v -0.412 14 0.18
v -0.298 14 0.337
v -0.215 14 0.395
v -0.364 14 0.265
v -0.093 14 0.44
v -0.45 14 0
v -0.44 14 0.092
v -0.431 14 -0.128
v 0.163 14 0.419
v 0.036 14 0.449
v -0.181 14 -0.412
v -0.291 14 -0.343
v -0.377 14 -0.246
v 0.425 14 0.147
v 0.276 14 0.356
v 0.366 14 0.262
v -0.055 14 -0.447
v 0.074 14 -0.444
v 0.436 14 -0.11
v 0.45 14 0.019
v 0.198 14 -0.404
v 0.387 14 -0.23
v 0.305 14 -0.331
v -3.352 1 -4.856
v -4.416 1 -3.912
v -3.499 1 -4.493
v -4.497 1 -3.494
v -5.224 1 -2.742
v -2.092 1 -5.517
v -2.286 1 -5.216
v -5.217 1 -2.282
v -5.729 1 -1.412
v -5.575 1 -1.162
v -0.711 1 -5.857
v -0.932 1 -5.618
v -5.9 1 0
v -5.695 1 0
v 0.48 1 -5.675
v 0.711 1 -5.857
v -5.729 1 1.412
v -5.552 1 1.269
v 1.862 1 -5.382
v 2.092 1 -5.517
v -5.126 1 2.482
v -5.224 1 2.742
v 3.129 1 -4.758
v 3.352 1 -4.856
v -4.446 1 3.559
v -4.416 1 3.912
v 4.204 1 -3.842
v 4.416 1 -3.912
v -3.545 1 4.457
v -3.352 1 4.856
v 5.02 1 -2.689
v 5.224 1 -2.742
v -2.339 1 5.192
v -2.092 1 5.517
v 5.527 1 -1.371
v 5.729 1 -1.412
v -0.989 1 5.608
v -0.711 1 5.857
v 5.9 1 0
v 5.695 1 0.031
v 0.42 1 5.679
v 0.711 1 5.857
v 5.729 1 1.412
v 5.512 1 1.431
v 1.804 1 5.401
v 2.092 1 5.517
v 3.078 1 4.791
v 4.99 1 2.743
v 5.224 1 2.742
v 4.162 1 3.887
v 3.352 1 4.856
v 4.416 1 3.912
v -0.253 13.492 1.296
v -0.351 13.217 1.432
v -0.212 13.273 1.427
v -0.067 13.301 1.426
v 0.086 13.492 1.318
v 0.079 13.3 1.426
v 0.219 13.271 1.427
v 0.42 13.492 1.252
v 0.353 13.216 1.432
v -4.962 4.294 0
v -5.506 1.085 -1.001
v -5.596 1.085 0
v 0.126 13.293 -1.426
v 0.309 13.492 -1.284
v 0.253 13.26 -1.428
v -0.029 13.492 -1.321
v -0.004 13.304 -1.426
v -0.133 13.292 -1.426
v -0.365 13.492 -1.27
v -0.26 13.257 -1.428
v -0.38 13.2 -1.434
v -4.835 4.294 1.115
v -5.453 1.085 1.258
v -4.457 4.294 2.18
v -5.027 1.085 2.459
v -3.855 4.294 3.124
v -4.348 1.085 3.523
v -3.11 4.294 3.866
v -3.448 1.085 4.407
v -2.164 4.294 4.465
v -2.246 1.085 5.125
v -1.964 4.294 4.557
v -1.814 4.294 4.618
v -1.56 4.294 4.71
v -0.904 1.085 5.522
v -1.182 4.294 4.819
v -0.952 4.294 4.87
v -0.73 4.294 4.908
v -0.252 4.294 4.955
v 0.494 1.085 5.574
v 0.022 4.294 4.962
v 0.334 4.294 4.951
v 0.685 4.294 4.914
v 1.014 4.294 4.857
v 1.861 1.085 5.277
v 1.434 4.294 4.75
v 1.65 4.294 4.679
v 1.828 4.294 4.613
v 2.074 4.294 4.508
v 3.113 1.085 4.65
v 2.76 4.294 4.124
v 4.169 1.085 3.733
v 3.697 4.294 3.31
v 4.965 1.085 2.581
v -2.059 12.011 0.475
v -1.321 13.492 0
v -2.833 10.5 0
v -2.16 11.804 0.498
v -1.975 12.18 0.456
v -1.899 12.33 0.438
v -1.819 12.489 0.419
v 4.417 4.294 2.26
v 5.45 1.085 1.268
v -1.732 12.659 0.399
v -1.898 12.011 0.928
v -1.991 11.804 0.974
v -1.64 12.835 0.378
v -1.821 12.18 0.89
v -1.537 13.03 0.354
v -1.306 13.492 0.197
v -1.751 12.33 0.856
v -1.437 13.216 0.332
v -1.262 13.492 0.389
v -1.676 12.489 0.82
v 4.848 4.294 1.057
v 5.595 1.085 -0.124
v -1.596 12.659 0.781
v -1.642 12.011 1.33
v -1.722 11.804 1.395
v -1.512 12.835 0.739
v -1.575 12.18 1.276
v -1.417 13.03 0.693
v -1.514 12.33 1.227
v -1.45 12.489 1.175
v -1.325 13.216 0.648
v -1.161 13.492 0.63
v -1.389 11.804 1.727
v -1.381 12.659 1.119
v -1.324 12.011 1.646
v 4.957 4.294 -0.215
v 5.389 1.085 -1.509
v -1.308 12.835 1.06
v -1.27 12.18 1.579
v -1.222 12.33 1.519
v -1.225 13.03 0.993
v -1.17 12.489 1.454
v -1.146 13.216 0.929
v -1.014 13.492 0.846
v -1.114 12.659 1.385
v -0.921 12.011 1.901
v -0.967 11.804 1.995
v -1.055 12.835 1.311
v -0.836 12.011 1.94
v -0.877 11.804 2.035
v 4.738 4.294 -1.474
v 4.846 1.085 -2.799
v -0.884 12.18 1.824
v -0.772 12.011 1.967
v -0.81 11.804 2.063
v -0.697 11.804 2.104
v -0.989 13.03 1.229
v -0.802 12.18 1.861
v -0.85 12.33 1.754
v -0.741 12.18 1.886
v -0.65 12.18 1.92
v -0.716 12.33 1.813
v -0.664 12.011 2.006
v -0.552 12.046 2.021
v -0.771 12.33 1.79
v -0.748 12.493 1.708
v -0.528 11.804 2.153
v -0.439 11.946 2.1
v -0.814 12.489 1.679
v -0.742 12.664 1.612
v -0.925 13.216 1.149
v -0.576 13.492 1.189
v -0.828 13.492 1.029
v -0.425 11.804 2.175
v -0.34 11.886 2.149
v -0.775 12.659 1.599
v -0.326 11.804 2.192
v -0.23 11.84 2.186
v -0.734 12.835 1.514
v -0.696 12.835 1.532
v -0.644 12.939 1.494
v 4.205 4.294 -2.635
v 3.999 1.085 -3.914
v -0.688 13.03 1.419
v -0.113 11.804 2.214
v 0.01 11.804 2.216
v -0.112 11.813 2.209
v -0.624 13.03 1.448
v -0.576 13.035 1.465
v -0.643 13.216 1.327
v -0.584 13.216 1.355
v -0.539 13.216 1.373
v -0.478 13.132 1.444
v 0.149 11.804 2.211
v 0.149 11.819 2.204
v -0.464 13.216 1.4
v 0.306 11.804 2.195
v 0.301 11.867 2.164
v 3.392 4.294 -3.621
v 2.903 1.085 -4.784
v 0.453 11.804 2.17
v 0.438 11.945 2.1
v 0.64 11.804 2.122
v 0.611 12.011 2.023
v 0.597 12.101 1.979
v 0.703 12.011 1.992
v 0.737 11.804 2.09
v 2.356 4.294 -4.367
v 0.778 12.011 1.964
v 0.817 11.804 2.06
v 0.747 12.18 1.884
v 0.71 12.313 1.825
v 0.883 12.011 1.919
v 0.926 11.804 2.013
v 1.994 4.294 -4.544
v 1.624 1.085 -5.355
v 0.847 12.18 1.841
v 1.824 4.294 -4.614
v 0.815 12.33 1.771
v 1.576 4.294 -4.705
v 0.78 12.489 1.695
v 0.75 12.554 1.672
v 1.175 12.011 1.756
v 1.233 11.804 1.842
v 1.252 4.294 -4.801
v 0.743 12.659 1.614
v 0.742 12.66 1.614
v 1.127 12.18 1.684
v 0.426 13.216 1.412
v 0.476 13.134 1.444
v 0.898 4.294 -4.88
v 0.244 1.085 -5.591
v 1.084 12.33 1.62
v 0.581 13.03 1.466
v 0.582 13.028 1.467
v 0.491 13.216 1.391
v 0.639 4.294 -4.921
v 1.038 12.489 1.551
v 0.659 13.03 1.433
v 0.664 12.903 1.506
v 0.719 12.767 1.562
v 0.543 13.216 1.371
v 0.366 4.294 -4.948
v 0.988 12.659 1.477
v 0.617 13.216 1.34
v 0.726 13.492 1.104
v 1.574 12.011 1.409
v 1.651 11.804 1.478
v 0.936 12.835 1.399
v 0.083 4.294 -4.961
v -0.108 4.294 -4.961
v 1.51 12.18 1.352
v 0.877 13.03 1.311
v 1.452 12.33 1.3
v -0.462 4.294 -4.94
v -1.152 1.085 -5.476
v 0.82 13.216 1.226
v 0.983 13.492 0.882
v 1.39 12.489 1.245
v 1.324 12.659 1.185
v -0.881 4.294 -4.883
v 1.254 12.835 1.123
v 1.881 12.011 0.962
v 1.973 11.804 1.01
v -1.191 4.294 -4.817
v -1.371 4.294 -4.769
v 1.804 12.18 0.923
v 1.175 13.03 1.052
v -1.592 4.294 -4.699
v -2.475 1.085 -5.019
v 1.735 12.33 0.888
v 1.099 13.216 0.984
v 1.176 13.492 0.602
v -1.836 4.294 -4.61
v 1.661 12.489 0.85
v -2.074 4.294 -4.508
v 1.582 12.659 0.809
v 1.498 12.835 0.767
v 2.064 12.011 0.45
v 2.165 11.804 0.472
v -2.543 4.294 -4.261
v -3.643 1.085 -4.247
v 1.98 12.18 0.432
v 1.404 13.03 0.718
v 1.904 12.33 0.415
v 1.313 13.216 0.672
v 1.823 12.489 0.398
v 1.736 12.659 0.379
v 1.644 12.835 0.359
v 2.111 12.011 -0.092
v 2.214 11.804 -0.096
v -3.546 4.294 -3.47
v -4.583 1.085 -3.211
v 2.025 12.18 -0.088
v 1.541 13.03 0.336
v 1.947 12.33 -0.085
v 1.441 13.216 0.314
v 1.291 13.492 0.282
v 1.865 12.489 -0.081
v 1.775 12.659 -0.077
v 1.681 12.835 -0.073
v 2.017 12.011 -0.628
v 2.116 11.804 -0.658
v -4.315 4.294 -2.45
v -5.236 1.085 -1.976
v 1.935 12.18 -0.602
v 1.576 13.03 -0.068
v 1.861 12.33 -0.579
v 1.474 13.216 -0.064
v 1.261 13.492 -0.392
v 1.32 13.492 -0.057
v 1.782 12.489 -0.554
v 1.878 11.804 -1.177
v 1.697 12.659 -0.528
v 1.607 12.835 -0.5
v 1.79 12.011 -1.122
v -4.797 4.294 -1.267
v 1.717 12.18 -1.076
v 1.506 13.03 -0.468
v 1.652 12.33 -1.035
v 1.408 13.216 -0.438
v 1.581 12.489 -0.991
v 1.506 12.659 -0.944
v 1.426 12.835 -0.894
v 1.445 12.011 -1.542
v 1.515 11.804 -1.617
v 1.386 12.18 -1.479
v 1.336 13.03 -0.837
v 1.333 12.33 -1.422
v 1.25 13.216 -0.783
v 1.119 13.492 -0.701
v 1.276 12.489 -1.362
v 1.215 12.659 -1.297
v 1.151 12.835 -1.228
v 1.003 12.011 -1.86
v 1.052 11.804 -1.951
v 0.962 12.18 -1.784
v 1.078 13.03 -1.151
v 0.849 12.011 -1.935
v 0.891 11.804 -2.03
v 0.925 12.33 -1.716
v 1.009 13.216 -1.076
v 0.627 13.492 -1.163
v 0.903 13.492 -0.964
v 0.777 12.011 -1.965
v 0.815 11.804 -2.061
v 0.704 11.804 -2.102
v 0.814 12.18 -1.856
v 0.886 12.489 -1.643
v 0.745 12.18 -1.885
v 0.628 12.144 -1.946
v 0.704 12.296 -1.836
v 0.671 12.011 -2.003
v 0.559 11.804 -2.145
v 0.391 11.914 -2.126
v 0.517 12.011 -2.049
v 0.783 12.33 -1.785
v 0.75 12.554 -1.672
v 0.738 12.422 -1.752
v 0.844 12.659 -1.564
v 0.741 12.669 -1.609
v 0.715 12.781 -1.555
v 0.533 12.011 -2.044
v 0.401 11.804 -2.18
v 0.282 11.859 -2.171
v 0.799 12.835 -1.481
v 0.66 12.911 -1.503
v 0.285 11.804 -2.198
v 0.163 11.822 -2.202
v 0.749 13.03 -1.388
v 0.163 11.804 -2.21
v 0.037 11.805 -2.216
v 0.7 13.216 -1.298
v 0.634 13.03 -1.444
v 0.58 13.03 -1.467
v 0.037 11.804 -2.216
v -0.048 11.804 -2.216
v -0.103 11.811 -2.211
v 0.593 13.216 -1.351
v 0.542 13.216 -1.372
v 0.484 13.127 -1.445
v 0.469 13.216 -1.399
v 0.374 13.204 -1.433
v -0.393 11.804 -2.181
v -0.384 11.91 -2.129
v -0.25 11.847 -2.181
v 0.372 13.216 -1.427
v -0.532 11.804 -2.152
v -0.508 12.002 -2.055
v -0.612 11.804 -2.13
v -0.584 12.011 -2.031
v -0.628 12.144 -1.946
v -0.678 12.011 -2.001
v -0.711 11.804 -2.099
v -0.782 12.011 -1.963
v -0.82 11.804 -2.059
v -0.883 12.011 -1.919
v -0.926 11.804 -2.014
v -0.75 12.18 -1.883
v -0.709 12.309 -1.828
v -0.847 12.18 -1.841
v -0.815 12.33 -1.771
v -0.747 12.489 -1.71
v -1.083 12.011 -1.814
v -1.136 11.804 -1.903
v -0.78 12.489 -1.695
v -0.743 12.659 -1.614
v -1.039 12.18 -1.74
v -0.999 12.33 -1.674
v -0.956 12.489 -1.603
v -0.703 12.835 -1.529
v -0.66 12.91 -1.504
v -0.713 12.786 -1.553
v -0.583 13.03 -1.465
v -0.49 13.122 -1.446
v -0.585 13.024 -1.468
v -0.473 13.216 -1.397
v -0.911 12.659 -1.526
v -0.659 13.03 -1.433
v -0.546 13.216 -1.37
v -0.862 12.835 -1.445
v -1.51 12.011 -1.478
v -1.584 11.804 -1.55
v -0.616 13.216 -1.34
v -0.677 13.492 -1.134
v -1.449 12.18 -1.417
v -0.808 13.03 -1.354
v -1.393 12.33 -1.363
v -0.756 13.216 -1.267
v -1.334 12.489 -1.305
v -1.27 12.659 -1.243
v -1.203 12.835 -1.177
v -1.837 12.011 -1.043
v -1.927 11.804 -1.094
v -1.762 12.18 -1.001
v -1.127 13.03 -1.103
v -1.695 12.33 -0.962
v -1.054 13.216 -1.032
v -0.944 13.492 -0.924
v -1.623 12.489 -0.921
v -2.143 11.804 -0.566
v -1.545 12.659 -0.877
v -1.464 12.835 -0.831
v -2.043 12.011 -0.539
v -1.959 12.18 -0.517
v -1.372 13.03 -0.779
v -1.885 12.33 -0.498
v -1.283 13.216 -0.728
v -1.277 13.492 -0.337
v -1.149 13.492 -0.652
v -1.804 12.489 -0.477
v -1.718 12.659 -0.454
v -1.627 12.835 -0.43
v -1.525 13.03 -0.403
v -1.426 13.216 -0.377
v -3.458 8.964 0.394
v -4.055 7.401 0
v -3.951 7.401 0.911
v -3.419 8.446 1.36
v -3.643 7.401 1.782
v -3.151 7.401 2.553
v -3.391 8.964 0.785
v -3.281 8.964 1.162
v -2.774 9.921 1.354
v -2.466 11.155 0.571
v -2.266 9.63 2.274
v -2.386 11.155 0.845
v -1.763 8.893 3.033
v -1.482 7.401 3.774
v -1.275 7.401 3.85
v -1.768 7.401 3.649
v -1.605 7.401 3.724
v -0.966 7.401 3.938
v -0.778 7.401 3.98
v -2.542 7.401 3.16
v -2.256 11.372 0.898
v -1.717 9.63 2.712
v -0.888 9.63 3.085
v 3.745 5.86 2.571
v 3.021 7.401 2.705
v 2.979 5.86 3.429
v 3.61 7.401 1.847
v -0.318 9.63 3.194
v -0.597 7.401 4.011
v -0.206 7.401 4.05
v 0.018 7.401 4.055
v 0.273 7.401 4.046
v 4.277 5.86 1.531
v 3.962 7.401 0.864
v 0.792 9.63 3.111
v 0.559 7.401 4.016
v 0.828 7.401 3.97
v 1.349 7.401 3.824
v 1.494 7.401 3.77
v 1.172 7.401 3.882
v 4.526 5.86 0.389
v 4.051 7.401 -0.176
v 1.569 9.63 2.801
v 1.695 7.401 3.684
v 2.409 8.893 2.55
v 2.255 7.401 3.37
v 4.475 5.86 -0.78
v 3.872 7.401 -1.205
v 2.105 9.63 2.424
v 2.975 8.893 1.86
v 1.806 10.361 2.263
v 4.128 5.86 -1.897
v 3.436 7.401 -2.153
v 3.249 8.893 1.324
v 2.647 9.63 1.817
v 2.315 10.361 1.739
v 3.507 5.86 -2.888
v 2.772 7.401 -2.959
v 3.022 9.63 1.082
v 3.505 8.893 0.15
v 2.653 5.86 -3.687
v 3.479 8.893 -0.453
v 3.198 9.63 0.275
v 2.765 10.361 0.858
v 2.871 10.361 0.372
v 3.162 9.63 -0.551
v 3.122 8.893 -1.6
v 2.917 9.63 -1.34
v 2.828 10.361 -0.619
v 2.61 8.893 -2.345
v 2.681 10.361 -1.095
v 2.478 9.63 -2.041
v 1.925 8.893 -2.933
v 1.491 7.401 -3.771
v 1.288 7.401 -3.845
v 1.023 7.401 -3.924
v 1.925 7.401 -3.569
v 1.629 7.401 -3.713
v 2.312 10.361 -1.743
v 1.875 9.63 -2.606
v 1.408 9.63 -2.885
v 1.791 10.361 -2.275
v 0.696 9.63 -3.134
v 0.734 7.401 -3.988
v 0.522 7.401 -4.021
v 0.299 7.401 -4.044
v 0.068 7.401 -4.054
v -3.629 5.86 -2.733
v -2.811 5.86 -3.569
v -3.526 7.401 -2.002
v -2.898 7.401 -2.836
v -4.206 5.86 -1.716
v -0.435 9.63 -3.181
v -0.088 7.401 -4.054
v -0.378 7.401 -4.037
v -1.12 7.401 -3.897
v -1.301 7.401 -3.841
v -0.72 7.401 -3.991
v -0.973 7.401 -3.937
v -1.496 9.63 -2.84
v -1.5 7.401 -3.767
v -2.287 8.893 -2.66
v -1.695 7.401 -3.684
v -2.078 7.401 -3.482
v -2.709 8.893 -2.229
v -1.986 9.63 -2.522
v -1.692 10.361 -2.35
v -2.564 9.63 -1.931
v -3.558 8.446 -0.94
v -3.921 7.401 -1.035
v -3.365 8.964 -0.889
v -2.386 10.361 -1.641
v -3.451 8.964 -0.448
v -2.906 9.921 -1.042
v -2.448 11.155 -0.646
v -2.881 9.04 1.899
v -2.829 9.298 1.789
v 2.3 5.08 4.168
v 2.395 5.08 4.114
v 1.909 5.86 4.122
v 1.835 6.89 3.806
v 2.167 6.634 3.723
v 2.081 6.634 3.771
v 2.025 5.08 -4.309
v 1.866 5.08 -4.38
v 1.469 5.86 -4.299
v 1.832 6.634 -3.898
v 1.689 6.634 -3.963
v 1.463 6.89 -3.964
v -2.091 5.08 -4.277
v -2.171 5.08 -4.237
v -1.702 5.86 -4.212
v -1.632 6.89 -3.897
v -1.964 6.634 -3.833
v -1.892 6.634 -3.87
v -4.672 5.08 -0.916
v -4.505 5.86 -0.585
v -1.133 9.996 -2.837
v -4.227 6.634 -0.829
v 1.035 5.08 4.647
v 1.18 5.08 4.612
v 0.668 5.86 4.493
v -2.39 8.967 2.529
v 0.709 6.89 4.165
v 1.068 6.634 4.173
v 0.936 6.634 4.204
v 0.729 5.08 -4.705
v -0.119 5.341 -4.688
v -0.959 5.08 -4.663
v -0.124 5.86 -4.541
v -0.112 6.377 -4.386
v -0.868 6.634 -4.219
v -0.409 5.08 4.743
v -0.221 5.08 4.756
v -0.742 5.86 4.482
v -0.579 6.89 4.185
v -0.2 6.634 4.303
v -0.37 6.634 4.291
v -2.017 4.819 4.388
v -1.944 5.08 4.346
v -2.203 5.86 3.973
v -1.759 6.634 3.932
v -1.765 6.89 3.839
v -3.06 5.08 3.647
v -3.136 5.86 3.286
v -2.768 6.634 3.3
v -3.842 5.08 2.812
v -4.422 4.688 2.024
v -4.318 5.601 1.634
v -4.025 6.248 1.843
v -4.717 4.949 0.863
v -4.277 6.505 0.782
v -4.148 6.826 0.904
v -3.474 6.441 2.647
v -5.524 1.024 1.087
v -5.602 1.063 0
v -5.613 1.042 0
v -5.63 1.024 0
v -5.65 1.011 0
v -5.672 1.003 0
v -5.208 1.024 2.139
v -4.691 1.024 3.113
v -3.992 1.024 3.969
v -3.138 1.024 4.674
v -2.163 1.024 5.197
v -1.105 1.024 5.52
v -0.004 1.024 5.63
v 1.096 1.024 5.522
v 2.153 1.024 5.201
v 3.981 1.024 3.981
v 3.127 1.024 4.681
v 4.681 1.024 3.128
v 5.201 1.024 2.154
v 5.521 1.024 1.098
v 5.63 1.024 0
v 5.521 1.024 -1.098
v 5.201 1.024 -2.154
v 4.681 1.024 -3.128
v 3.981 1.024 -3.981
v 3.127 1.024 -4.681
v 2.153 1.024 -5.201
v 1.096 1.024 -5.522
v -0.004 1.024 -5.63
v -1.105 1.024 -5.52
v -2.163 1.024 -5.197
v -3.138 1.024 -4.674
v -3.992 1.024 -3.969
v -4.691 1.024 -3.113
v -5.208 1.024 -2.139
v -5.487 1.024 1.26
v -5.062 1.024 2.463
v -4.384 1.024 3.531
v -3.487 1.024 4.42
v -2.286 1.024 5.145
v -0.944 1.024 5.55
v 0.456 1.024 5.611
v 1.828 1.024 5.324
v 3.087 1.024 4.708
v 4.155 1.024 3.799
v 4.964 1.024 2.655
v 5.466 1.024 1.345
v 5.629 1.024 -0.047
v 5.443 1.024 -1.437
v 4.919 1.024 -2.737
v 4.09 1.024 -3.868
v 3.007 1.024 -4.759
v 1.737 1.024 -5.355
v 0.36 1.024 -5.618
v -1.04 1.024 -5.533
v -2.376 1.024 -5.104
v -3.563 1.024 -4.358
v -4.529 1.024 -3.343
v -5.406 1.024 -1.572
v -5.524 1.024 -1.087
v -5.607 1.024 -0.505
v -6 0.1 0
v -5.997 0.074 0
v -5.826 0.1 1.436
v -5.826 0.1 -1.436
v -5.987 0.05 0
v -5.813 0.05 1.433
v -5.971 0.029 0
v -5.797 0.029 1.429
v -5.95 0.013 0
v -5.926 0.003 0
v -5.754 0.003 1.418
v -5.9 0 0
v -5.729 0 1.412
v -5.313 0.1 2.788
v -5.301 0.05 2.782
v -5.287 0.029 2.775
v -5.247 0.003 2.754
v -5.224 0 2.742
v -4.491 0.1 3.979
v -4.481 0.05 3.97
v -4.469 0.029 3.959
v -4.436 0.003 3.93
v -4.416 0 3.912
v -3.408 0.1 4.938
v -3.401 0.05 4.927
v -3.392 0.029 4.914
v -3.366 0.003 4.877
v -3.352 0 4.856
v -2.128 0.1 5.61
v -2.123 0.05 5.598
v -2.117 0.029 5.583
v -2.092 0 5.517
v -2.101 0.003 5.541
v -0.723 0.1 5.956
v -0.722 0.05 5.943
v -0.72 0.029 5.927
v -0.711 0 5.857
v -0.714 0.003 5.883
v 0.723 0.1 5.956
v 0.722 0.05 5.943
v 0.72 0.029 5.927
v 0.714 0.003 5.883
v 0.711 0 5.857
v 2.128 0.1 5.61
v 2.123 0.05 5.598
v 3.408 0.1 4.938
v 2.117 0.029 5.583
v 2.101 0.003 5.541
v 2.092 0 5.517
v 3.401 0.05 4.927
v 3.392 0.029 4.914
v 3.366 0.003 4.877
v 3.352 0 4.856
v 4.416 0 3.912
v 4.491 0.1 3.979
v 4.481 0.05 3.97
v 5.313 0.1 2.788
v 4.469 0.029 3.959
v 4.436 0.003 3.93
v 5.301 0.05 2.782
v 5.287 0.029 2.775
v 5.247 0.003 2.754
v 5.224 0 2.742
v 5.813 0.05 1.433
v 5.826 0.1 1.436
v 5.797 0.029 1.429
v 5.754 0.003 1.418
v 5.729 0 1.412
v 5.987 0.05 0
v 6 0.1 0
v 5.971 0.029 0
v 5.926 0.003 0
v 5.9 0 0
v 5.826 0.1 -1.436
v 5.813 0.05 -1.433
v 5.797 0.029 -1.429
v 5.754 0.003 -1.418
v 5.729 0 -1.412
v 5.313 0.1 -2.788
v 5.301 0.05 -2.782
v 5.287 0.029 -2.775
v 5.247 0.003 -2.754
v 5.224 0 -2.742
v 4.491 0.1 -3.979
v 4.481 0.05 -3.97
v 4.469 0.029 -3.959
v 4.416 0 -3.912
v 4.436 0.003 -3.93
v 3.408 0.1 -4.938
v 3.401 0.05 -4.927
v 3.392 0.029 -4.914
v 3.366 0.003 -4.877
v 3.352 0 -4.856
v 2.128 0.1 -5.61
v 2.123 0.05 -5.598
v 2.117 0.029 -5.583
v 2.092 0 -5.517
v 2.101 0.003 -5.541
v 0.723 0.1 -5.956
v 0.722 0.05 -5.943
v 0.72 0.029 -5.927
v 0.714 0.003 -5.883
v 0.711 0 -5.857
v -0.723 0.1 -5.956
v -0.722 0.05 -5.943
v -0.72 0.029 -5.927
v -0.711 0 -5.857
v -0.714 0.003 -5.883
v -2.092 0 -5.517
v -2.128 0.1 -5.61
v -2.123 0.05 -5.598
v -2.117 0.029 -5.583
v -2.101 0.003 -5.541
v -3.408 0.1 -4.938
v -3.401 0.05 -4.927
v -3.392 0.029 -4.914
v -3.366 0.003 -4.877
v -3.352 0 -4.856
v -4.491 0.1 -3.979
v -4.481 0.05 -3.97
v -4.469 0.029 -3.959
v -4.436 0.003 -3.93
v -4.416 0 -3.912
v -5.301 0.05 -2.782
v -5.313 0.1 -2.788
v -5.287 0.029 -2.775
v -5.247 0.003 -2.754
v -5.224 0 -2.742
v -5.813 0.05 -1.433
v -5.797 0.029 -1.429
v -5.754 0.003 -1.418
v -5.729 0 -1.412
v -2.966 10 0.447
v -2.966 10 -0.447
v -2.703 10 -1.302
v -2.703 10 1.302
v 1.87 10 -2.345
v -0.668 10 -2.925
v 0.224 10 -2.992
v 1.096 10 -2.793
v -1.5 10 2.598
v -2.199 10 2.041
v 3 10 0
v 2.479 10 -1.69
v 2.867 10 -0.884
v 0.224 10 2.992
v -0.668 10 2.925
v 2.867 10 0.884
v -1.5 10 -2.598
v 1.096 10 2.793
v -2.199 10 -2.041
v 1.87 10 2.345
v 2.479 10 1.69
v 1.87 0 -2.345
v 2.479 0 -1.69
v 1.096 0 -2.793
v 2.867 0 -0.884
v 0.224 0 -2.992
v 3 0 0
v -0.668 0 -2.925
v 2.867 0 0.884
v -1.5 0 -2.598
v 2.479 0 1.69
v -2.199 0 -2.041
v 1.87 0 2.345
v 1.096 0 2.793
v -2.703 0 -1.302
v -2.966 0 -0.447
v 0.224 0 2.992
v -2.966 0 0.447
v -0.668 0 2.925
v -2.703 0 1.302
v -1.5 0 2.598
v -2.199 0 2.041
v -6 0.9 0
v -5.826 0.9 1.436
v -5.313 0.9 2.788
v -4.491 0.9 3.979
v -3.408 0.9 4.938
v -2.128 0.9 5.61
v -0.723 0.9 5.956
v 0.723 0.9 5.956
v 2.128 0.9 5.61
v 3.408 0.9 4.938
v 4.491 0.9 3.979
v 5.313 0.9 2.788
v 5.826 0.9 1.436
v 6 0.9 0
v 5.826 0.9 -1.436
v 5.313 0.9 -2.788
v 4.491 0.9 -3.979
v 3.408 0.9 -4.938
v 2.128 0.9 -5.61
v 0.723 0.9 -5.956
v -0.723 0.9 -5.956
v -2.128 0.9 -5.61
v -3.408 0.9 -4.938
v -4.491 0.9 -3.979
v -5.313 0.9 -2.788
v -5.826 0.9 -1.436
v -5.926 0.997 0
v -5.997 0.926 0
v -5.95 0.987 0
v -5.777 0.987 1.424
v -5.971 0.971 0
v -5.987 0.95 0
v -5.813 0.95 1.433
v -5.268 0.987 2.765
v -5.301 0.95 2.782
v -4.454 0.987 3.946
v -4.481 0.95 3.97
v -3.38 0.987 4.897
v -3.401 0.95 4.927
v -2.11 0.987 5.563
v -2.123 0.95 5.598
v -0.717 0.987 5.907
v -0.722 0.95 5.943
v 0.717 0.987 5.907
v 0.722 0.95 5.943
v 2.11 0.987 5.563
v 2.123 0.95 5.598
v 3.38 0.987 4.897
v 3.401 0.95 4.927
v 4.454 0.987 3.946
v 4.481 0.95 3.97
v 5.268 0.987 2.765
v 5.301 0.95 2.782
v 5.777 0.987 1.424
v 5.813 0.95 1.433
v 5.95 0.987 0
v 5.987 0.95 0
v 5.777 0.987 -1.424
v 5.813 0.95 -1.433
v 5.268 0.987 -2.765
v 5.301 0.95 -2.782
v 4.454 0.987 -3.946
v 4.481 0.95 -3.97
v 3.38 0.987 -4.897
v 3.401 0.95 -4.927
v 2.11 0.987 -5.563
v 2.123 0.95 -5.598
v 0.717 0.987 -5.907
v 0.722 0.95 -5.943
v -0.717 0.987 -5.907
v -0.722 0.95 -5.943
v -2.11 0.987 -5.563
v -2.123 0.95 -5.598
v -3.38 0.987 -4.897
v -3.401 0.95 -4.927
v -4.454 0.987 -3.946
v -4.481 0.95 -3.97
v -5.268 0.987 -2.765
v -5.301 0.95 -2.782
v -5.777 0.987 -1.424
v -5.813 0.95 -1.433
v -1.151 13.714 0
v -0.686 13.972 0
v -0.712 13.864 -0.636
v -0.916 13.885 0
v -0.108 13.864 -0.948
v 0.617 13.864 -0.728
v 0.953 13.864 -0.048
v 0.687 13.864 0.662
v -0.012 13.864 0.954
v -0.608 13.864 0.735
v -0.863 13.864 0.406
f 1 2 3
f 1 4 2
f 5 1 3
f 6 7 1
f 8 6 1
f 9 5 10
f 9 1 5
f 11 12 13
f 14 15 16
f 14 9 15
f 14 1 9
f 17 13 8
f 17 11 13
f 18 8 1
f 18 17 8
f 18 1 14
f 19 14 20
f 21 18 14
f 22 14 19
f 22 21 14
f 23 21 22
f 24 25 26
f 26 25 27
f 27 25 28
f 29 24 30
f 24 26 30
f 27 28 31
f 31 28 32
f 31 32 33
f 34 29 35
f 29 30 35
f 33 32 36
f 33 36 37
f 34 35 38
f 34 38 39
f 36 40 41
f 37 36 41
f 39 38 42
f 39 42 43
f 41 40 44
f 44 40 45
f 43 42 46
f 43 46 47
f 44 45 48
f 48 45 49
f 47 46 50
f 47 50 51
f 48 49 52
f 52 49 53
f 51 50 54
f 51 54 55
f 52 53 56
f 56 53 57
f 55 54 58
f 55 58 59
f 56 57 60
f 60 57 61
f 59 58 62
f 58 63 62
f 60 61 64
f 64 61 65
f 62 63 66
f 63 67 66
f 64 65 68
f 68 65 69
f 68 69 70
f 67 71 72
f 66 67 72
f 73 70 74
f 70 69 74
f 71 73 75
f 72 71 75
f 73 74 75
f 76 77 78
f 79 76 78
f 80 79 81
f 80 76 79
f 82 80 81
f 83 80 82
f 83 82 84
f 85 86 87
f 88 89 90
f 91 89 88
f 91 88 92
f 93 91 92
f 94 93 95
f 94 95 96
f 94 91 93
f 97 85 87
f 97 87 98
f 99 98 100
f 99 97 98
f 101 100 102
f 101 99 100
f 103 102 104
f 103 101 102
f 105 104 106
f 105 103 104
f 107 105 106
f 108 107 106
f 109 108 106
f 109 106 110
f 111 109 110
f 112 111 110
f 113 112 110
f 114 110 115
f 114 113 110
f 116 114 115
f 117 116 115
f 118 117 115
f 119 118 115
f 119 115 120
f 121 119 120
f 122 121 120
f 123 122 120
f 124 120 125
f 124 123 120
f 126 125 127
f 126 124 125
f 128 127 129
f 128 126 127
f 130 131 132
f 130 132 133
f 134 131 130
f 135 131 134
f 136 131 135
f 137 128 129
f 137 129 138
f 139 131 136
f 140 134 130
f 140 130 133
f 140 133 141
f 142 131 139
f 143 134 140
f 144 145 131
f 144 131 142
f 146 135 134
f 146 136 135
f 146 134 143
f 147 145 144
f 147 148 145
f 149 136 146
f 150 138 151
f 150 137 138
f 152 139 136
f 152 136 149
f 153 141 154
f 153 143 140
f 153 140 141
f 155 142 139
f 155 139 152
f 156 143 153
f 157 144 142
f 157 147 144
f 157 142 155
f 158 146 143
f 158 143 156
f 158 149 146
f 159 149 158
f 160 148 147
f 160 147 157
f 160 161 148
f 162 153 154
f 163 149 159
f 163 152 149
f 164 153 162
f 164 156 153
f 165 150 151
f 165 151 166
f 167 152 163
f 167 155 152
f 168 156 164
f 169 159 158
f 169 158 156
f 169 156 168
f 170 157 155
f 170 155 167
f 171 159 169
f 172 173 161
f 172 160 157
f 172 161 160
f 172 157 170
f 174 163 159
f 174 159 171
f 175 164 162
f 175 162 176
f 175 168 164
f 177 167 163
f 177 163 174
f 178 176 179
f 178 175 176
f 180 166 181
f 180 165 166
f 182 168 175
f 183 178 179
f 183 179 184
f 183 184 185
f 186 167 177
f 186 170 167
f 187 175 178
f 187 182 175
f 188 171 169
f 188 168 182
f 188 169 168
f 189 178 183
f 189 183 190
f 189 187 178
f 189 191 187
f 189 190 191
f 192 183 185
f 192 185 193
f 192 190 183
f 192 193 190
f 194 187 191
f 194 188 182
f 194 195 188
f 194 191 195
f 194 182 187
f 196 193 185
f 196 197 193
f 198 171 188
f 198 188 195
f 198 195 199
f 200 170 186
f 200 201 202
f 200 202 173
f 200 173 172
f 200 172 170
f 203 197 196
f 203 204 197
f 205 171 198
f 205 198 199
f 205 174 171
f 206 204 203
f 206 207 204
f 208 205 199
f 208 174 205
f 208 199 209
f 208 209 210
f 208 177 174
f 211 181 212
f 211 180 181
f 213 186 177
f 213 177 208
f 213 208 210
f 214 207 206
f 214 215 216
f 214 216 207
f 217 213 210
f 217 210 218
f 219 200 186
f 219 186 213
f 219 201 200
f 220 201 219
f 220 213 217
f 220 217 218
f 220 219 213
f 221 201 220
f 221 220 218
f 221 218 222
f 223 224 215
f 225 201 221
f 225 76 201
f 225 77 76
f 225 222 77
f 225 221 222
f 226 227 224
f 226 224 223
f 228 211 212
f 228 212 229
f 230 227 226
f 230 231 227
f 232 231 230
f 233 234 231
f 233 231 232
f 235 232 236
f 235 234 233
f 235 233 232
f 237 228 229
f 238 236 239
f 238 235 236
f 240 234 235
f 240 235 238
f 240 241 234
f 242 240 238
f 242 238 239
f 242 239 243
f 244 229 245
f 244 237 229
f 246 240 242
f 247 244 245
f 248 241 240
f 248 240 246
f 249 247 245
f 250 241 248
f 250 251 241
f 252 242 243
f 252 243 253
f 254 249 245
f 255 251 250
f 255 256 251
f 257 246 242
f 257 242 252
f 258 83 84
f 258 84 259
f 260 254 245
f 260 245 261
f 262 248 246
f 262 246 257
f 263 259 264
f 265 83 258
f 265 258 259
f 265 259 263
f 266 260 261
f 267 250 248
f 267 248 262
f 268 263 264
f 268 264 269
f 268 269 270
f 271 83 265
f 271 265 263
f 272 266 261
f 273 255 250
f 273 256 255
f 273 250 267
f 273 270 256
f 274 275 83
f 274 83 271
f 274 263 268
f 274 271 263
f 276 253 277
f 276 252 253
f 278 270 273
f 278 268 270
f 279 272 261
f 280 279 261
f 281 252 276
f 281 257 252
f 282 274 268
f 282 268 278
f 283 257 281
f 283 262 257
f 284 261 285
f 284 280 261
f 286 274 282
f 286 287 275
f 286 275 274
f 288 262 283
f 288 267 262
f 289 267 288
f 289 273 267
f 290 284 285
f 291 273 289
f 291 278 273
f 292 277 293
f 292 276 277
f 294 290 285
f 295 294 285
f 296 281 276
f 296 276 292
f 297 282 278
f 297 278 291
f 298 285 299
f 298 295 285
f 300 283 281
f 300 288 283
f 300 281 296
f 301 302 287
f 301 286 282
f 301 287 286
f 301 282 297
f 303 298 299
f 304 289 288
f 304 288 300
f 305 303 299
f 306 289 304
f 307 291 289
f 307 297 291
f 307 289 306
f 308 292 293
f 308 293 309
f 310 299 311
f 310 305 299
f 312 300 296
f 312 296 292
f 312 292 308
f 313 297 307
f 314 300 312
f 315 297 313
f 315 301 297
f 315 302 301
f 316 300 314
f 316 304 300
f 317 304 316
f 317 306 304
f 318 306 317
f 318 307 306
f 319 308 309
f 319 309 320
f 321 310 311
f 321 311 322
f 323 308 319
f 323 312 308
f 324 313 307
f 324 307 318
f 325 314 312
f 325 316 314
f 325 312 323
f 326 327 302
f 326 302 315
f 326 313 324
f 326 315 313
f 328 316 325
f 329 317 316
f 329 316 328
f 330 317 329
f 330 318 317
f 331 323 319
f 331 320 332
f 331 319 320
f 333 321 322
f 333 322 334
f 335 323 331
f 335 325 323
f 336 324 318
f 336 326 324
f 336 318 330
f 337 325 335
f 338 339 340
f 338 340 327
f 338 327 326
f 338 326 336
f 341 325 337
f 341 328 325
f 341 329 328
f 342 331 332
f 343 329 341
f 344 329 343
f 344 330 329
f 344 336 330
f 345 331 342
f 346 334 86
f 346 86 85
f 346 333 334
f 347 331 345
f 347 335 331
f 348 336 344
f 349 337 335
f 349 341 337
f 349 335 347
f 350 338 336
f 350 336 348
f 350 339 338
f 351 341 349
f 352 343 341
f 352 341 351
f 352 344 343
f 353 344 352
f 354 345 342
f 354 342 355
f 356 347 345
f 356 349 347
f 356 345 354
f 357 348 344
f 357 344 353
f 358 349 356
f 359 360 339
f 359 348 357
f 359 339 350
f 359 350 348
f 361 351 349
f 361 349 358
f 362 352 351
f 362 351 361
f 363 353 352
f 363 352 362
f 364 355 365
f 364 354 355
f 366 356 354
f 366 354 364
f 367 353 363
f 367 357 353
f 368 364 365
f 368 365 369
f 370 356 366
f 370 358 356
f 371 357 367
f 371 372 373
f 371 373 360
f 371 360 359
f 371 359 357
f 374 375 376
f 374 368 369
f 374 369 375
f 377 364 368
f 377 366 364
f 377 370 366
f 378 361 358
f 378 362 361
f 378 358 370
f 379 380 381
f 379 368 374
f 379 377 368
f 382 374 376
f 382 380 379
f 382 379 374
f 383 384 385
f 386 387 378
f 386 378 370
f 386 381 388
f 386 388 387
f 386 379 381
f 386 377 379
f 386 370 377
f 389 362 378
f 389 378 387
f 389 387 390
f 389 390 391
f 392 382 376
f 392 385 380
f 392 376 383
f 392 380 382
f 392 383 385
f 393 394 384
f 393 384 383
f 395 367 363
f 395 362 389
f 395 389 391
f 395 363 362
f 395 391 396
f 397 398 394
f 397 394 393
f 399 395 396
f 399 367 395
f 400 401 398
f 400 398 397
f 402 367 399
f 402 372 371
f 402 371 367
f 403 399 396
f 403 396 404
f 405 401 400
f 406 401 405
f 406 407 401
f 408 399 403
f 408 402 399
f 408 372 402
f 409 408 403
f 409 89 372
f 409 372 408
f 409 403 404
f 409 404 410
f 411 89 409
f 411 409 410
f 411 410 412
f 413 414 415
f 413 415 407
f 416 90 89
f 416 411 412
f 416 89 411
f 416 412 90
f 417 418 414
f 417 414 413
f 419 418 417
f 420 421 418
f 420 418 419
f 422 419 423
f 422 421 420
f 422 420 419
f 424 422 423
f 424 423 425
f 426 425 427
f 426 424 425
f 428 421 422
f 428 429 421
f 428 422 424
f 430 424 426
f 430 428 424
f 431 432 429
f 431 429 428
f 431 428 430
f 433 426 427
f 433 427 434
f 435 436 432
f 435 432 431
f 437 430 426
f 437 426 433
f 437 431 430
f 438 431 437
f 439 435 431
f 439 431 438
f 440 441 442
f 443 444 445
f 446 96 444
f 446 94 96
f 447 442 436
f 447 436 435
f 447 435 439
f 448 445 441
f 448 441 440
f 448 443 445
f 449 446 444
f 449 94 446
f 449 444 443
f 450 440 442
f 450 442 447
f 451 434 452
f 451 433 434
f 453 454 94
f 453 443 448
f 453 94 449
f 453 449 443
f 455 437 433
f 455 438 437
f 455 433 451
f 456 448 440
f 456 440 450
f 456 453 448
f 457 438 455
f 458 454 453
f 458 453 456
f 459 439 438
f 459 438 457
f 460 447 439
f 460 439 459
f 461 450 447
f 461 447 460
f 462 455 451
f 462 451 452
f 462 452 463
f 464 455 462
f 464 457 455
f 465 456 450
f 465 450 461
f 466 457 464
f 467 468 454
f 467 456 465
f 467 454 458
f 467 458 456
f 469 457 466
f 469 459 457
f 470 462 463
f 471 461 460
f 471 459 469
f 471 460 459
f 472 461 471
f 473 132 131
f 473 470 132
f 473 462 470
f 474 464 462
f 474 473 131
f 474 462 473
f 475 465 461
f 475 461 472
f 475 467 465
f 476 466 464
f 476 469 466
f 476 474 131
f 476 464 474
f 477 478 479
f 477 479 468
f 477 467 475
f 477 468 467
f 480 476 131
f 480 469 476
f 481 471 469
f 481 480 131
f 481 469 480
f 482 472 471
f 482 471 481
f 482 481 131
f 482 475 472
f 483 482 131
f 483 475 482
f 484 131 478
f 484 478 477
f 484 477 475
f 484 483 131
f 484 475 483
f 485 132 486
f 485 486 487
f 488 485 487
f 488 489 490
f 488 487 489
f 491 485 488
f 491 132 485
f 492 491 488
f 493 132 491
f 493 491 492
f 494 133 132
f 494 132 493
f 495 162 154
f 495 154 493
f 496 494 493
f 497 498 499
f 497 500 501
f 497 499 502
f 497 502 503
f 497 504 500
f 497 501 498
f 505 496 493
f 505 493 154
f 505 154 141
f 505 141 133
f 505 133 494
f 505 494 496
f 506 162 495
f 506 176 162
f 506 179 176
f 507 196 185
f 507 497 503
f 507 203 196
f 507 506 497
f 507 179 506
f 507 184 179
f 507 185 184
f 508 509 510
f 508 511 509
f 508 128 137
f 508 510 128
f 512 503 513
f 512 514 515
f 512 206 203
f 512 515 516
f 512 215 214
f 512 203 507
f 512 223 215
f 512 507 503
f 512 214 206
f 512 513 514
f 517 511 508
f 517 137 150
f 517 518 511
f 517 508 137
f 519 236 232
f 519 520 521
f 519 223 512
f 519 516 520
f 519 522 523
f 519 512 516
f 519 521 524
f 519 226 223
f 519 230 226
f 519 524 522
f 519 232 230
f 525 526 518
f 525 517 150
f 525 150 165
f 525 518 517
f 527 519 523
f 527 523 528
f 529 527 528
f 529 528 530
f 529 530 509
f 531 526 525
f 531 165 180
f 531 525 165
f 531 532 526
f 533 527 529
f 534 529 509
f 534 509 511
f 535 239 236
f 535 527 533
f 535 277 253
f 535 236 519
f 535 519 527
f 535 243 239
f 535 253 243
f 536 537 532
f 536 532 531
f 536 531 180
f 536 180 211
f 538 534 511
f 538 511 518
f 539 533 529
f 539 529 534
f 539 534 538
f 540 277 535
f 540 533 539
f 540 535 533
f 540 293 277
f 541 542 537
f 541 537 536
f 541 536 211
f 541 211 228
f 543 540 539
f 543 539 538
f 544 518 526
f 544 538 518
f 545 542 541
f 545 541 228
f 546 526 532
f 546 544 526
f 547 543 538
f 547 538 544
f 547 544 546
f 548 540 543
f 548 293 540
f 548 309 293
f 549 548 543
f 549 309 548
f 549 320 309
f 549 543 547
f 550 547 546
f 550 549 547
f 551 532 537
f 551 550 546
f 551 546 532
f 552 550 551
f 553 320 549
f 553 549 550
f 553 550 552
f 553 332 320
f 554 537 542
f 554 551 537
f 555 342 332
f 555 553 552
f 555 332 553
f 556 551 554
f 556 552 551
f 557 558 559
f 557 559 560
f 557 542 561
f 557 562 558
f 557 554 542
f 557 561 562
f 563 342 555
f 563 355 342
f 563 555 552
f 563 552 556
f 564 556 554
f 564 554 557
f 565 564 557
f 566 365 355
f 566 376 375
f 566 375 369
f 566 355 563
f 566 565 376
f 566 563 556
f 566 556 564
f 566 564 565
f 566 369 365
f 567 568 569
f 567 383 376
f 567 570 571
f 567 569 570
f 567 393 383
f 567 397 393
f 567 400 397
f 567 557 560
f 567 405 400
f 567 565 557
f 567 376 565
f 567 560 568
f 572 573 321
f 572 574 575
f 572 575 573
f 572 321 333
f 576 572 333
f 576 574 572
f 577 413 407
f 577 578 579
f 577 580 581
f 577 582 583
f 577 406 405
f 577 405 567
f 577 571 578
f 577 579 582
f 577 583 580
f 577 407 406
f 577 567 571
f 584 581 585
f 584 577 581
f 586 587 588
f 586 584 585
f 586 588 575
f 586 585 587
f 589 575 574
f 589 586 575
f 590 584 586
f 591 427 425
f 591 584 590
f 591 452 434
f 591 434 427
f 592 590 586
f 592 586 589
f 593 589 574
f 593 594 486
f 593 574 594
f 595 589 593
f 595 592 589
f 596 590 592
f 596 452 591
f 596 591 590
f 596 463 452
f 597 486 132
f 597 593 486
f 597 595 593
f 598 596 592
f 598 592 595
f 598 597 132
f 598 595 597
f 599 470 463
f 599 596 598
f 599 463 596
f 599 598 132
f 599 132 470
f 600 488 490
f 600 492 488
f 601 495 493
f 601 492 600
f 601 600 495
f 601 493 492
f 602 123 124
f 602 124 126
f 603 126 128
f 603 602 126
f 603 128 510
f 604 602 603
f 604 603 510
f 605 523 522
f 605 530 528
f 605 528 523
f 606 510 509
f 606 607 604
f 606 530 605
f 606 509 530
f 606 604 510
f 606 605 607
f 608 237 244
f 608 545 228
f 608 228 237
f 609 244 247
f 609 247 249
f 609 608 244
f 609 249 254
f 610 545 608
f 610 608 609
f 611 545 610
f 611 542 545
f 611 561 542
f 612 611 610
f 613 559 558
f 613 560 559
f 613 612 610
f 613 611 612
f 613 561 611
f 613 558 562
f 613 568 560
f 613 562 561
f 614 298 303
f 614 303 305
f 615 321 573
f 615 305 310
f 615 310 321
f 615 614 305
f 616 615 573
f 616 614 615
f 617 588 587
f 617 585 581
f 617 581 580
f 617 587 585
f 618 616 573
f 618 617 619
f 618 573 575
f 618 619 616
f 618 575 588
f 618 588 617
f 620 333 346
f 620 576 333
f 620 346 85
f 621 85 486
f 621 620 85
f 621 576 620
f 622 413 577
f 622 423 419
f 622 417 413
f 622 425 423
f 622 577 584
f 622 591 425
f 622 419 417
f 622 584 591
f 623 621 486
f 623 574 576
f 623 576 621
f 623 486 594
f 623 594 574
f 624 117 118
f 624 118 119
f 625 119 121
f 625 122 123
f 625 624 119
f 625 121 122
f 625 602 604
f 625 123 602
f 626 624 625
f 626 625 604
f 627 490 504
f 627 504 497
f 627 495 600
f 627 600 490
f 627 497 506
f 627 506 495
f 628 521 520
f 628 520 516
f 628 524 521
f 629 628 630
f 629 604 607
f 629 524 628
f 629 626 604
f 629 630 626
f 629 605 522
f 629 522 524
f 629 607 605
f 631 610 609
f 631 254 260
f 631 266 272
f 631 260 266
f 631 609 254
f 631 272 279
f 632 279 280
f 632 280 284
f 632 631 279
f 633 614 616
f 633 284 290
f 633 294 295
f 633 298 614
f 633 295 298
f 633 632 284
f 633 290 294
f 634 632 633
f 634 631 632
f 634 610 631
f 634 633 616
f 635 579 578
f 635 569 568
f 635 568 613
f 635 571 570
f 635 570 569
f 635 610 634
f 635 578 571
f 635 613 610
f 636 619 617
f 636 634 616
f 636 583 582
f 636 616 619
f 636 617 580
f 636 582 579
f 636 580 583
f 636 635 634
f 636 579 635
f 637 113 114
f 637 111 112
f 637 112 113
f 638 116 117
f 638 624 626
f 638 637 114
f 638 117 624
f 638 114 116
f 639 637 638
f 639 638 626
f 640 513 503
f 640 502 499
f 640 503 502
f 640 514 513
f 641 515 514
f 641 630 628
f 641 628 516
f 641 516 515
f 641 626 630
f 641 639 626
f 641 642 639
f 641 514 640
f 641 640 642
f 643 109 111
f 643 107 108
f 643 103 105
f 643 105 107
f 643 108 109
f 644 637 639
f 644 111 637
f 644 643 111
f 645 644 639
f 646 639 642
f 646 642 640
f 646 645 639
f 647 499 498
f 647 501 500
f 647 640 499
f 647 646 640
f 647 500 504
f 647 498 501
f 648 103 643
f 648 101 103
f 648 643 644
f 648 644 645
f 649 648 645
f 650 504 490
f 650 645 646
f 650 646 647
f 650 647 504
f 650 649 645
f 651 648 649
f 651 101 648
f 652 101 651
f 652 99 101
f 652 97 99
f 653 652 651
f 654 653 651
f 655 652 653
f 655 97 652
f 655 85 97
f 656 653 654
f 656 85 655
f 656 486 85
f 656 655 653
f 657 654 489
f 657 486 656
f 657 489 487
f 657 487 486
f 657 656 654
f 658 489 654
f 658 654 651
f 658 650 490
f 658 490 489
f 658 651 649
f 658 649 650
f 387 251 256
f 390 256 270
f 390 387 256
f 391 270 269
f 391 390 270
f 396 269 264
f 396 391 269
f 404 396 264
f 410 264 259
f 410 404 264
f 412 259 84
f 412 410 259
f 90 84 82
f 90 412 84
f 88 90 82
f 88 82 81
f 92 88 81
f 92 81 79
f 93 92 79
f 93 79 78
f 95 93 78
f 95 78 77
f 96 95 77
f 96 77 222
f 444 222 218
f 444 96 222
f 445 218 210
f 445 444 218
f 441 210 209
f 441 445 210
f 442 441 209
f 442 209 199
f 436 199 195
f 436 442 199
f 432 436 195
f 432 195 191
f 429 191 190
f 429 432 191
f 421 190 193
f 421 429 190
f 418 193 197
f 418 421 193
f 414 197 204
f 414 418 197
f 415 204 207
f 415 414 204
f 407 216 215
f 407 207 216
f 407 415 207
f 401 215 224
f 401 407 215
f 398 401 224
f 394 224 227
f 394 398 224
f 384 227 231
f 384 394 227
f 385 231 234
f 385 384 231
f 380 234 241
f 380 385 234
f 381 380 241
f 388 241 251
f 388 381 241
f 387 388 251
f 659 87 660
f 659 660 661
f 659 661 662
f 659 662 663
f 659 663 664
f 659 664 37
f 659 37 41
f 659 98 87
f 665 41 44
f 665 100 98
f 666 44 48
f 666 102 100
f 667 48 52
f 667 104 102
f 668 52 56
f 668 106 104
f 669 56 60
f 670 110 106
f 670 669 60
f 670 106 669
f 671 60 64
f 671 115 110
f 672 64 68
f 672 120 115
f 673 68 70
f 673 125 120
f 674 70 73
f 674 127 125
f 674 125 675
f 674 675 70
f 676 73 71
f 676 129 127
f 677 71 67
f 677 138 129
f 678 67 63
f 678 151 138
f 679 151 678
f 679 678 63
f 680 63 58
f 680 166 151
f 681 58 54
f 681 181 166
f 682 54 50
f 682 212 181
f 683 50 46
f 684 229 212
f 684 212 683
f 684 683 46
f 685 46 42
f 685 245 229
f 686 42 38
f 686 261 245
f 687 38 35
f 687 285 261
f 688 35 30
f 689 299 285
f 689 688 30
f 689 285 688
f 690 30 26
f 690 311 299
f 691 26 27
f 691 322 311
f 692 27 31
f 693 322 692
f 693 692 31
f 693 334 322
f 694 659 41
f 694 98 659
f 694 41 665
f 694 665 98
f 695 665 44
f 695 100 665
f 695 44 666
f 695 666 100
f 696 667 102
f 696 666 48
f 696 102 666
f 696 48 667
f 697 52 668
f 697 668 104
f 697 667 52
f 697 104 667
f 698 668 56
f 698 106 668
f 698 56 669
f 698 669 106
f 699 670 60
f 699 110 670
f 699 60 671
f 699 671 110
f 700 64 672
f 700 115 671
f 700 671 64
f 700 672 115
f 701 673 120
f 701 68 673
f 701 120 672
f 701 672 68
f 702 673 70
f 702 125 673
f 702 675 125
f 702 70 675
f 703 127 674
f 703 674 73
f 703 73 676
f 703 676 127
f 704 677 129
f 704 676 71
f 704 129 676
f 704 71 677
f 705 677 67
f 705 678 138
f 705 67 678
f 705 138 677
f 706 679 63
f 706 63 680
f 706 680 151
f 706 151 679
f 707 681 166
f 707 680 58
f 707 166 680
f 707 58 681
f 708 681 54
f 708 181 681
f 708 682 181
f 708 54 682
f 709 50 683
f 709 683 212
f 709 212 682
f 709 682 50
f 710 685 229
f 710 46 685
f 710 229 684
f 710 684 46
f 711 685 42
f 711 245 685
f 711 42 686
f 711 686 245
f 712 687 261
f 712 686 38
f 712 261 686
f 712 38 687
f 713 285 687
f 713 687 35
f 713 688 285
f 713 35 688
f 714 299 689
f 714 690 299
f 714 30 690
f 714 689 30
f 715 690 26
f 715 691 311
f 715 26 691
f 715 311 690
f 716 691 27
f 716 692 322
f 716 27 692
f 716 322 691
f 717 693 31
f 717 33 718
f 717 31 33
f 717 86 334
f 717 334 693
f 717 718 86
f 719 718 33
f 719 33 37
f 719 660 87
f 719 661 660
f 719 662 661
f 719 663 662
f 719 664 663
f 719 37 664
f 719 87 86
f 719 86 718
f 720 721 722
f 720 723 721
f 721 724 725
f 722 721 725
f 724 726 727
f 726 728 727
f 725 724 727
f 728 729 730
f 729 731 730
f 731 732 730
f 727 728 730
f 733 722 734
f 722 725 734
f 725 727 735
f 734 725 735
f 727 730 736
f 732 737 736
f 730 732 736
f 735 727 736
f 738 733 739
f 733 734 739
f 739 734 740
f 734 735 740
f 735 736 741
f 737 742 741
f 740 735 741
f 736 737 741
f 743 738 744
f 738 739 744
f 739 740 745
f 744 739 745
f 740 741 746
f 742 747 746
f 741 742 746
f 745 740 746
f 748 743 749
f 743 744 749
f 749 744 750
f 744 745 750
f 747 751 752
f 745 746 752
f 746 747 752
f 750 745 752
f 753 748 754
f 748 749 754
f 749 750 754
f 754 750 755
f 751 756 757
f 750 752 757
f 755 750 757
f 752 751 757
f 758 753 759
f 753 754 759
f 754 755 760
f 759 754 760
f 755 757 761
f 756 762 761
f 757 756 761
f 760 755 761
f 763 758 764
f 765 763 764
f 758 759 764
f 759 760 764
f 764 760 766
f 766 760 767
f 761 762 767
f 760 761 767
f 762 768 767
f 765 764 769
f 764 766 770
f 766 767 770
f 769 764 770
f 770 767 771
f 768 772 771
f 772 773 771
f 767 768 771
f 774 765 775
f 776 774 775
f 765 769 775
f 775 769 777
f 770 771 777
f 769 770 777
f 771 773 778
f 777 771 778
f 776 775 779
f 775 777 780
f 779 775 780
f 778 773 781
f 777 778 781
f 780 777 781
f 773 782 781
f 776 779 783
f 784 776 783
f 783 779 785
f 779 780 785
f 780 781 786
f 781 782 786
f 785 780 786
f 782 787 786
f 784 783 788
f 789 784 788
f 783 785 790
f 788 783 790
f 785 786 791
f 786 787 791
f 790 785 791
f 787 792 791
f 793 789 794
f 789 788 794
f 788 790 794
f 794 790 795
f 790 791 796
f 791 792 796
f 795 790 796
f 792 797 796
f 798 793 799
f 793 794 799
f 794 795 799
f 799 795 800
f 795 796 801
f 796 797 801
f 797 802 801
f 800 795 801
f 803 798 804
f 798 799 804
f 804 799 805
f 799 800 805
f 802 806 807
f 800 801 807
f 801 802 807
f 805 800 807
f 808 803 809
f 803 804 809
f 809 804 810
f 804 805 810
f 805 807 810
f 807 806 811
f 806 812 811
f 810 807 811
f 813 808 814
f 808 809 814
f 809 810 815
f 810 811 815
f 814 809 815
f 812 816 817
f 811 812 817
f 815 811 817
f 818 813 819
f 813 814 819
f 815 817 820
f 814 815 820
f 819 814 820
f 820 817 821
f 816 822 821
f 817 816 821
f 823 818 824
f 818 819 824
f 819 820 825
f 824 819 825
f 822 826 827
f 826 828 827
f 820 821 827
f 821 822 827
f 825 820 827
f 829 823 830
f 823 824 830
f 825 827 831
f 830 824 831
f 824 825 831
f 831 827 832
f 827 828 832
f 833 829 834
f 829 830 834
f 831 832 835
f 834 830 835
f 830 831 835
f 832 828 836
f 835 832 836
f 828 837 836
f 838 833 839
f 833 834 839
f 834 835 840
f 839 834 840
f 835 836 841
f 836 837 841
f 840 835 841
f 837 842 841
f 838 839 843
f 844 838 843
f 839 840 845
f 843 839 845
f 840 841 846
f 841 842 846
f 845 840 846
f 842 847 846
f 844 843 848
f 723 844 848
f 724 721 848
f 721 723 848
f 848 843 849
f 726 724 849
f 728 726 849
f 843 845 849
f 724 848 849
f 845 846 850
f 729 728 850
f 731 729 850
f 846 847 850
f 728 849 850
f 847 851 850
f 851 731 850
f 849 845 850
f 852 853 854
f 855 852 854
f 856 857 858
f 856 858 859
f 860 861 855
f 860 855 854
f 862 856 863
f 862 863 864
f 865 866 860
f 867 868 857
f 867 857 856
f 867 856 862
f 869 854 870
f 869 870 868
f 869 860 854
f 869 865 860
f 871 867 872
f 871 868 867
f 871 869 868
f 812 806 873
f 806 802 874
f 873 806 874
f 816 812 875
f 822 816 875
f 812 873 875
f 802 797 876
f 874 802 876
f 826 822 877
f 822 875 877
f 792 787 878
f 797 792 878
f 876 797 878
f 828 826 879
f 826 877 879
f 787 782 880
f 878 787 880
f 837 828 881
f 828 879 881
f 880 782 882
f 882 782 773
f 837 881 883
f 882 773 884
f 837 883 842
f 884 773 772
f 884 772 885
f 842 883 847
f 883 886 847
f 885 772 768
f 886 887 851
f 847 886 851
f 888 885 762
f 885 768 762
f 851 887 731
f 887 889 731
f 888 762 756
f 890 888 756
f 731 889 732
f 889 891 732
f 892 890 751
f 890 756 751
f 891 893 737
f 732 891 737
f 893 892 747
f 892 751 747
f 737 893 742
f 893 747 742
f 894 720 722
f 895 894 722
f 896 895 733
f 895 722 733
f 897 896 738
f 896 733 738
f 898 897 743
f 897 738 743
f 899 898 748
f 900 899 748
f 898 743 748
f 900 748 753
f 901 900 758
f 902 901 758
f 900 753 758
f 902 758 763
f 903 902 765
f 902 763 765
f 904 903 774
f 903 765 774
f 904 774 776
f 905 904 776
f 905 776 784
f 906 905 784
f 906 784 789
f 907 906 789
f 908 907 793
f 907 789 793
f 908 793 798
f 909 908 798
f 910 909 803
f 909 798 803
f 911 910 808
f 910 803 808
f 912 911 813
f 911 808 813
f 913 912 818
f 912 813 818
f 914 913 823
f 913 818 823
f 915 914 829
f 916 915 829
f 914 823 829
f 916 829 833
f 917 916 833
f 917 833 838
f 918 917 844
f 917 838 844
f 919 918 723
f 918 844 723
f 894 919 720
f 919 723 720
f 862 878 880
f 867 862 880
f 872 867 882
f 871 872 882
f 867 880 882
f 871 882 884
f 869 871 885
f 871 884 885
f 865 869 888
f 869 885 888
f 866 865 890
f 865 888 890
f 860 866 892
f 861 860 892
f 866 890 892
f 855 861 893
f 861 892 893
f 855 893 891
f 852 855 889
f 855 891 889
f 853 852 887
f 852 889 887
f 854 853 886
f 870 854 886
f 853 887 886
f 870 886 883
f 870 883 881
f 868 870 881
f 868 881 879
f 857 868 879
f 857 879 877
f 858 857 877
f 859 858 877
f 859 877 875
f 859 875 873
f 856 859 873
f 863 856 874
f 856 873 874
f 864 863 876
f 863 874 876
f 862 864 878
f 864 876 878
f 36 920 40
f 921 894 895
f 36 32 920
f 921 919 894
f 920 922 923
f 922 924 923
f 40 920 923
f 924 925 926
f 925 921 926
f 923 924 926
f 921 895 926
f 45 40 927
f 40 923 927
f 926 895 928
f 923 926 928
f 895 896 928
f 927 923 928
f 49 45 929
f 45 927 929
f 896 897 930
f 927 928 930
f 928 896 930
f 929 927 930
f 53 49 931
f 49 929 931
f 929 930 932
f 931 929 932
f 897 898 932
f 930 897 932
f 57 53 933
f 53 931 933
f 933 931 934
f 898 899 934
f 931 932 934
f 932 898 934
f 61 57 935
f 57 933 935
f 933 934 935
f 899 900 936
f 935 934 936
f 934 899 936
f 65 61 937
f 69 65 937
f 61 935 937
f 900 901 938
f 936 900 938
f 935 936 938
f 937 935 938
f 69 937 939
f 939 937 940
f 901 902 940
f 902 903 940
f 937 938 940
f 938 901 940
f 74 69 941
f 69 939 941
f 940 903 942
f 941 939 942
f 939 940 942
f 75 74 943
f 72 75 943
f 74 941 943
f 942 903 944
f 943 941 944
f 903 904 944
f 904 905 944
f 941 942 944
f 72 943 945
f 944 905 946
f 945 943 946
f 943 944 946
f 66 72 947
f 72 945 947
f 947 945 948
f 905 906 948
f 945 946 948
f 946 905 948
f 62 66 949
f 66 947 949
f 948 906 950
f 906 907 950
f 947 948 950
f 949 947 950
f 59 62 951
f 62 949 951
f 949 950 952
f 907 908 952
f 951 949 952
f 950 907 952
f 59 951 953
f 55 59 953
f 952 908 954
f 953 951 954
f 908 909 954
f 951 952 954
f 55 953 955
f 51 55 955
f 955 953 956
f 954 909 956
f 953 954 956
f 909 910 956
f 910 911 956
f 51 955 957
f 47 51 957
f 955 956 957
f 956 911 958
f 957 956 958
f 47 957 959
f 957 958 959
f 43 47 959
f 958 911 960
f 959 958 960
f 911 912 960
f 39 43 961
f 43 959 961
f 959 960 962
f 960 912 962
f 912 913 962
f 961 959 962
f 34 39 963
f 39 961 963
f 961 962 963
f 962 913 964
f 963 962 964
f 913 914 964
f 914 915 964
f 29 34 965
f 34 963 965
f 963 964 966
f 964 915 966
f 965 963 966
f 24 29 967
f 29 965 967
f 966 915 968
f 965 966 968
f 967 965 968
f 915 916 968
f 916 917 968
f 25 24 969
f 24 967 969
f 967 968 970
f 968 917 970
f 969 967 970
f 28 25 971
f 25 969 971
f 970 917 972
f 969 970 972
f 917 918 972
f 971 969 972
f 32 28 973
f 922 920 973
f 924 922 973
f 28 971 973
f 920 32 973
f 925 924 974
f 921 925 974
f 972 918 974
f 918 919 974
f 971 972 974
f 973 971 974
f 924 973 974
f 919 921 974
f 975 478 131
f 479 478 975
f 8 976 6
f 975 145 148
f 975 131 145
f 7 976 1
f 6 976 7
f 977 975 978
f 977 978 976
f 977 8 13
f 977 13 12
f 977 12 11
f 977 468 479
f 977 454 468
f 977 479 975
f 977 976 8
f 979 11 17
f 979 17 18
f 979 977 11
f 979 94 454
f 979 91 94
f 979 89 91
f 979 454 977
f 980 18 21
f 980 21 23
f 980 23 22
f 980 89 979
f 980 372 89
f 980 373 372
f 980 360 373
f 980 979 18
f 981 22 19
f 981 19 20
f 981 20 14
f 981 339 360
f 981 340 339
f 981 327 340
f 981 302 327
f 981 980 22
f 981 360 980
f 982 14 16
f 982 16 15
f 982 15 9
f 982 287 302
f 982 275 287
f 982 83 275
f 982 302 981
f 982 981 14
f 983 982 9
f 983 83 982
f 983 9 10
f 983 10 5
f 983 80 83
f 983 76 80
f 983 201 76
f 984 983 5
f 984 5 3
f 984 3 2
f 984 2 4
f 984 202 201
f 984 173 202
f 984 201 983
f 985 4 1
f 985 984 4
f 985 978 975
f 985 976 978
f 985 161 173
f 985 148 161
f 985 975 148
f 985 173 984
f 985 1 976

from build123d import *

# Parameters (mm, degrees)
SKETCH2_R               = 1.10372573
CUT_EXTRUDE1_DEPTH      = 1
FILLET1_R               = 1
SKETCH3_R               = 0.75
CUT_EXTRUDE2_DEPTH      = 10
CUT_EXTRUDE2_DEPTH_BACK = 3
FILLET2_R               = 0.1
SKETCH4_R               = 3
CUT_EXTRUDE3_DEPTH      = 10


with BuildPart() as part:
    # Sketch1 → Revolve1 (revolve)
    with BuildSketch(Plane.XY):
        with BuildLine():
            Line((0, 0), (0, 15))
            Line((0, 15), (-0.422259829, 15))
            add(Edge.make_bspline(
                [(-5.608753273, 1), (-4.474708876, 8.543704993), (-0.422259829, 15)],
                knots=[0, 0, 0, 1, 1, 1], degree=2))
            Line((-5.608753273, 1), (-6, 1))
            Line((-6, 1), (-6, 0))
            Line((-6, 0), (0, 0))
        make_face()
    revolve(axis=Axis((0, 0, 0), (0, 1, 0)))

    # Sketch2 → Cut-Extrude1 (cut)
    with BuildSketch(Plane(origin=(0, 15, 0), x_dir=(1, 0, 0), z_dir=(0, 1, 0))):
        Circle(SKETCH2_R)
    extrude(amount=-CUT_EXTRUDE1_DEPTH, mode=Mode.SUBTRACT)

    # Fillet1
    fillet1_edges = [part.edges().sort_by_distance(p)[0] for p in [
        (1.028614291, 14, 1.9e-08),
    ]]
    fillet(fillet1_edges, radius=FILLET1_R)

    # Sketch3 → Cut-Extrude2 (cut, two sides)
    with BuildSketch(Plane.XY) as cut_extrude2_sk:
        with Locations((0, 12.554053904)):
            Circle(SKETCH3_R)
    extrude(amount=CUT_EXTRUDE2_DEPTH, mode=Mode.SUBTRACT)
    extrude(cut_extrude2_sk.sketch, amount=-CUT_EXTRUDE2_DEPTH_BACK, mode=Mode.SUBTRACT)

    # Fillet2
    fillet2_edges = [part.edges().sort_by_distance(p)[0] for p in [
        (6, 0, 0),
        (6, 1, 0),
        (5.608753273, 1, 0),
    ]]
    fillet(fillet2_edges, radius=FILLET2_R)

    # Sketch4 → Cut-Extrude3 (cut)
    with BuildSketch(Plane.XZ):
        Circle(SKETCH4_R)
    extrude(amount=-CUT_EXTRUDE3_DEPTH, mode=Mode.SUBTRACT)


solid = part.part
